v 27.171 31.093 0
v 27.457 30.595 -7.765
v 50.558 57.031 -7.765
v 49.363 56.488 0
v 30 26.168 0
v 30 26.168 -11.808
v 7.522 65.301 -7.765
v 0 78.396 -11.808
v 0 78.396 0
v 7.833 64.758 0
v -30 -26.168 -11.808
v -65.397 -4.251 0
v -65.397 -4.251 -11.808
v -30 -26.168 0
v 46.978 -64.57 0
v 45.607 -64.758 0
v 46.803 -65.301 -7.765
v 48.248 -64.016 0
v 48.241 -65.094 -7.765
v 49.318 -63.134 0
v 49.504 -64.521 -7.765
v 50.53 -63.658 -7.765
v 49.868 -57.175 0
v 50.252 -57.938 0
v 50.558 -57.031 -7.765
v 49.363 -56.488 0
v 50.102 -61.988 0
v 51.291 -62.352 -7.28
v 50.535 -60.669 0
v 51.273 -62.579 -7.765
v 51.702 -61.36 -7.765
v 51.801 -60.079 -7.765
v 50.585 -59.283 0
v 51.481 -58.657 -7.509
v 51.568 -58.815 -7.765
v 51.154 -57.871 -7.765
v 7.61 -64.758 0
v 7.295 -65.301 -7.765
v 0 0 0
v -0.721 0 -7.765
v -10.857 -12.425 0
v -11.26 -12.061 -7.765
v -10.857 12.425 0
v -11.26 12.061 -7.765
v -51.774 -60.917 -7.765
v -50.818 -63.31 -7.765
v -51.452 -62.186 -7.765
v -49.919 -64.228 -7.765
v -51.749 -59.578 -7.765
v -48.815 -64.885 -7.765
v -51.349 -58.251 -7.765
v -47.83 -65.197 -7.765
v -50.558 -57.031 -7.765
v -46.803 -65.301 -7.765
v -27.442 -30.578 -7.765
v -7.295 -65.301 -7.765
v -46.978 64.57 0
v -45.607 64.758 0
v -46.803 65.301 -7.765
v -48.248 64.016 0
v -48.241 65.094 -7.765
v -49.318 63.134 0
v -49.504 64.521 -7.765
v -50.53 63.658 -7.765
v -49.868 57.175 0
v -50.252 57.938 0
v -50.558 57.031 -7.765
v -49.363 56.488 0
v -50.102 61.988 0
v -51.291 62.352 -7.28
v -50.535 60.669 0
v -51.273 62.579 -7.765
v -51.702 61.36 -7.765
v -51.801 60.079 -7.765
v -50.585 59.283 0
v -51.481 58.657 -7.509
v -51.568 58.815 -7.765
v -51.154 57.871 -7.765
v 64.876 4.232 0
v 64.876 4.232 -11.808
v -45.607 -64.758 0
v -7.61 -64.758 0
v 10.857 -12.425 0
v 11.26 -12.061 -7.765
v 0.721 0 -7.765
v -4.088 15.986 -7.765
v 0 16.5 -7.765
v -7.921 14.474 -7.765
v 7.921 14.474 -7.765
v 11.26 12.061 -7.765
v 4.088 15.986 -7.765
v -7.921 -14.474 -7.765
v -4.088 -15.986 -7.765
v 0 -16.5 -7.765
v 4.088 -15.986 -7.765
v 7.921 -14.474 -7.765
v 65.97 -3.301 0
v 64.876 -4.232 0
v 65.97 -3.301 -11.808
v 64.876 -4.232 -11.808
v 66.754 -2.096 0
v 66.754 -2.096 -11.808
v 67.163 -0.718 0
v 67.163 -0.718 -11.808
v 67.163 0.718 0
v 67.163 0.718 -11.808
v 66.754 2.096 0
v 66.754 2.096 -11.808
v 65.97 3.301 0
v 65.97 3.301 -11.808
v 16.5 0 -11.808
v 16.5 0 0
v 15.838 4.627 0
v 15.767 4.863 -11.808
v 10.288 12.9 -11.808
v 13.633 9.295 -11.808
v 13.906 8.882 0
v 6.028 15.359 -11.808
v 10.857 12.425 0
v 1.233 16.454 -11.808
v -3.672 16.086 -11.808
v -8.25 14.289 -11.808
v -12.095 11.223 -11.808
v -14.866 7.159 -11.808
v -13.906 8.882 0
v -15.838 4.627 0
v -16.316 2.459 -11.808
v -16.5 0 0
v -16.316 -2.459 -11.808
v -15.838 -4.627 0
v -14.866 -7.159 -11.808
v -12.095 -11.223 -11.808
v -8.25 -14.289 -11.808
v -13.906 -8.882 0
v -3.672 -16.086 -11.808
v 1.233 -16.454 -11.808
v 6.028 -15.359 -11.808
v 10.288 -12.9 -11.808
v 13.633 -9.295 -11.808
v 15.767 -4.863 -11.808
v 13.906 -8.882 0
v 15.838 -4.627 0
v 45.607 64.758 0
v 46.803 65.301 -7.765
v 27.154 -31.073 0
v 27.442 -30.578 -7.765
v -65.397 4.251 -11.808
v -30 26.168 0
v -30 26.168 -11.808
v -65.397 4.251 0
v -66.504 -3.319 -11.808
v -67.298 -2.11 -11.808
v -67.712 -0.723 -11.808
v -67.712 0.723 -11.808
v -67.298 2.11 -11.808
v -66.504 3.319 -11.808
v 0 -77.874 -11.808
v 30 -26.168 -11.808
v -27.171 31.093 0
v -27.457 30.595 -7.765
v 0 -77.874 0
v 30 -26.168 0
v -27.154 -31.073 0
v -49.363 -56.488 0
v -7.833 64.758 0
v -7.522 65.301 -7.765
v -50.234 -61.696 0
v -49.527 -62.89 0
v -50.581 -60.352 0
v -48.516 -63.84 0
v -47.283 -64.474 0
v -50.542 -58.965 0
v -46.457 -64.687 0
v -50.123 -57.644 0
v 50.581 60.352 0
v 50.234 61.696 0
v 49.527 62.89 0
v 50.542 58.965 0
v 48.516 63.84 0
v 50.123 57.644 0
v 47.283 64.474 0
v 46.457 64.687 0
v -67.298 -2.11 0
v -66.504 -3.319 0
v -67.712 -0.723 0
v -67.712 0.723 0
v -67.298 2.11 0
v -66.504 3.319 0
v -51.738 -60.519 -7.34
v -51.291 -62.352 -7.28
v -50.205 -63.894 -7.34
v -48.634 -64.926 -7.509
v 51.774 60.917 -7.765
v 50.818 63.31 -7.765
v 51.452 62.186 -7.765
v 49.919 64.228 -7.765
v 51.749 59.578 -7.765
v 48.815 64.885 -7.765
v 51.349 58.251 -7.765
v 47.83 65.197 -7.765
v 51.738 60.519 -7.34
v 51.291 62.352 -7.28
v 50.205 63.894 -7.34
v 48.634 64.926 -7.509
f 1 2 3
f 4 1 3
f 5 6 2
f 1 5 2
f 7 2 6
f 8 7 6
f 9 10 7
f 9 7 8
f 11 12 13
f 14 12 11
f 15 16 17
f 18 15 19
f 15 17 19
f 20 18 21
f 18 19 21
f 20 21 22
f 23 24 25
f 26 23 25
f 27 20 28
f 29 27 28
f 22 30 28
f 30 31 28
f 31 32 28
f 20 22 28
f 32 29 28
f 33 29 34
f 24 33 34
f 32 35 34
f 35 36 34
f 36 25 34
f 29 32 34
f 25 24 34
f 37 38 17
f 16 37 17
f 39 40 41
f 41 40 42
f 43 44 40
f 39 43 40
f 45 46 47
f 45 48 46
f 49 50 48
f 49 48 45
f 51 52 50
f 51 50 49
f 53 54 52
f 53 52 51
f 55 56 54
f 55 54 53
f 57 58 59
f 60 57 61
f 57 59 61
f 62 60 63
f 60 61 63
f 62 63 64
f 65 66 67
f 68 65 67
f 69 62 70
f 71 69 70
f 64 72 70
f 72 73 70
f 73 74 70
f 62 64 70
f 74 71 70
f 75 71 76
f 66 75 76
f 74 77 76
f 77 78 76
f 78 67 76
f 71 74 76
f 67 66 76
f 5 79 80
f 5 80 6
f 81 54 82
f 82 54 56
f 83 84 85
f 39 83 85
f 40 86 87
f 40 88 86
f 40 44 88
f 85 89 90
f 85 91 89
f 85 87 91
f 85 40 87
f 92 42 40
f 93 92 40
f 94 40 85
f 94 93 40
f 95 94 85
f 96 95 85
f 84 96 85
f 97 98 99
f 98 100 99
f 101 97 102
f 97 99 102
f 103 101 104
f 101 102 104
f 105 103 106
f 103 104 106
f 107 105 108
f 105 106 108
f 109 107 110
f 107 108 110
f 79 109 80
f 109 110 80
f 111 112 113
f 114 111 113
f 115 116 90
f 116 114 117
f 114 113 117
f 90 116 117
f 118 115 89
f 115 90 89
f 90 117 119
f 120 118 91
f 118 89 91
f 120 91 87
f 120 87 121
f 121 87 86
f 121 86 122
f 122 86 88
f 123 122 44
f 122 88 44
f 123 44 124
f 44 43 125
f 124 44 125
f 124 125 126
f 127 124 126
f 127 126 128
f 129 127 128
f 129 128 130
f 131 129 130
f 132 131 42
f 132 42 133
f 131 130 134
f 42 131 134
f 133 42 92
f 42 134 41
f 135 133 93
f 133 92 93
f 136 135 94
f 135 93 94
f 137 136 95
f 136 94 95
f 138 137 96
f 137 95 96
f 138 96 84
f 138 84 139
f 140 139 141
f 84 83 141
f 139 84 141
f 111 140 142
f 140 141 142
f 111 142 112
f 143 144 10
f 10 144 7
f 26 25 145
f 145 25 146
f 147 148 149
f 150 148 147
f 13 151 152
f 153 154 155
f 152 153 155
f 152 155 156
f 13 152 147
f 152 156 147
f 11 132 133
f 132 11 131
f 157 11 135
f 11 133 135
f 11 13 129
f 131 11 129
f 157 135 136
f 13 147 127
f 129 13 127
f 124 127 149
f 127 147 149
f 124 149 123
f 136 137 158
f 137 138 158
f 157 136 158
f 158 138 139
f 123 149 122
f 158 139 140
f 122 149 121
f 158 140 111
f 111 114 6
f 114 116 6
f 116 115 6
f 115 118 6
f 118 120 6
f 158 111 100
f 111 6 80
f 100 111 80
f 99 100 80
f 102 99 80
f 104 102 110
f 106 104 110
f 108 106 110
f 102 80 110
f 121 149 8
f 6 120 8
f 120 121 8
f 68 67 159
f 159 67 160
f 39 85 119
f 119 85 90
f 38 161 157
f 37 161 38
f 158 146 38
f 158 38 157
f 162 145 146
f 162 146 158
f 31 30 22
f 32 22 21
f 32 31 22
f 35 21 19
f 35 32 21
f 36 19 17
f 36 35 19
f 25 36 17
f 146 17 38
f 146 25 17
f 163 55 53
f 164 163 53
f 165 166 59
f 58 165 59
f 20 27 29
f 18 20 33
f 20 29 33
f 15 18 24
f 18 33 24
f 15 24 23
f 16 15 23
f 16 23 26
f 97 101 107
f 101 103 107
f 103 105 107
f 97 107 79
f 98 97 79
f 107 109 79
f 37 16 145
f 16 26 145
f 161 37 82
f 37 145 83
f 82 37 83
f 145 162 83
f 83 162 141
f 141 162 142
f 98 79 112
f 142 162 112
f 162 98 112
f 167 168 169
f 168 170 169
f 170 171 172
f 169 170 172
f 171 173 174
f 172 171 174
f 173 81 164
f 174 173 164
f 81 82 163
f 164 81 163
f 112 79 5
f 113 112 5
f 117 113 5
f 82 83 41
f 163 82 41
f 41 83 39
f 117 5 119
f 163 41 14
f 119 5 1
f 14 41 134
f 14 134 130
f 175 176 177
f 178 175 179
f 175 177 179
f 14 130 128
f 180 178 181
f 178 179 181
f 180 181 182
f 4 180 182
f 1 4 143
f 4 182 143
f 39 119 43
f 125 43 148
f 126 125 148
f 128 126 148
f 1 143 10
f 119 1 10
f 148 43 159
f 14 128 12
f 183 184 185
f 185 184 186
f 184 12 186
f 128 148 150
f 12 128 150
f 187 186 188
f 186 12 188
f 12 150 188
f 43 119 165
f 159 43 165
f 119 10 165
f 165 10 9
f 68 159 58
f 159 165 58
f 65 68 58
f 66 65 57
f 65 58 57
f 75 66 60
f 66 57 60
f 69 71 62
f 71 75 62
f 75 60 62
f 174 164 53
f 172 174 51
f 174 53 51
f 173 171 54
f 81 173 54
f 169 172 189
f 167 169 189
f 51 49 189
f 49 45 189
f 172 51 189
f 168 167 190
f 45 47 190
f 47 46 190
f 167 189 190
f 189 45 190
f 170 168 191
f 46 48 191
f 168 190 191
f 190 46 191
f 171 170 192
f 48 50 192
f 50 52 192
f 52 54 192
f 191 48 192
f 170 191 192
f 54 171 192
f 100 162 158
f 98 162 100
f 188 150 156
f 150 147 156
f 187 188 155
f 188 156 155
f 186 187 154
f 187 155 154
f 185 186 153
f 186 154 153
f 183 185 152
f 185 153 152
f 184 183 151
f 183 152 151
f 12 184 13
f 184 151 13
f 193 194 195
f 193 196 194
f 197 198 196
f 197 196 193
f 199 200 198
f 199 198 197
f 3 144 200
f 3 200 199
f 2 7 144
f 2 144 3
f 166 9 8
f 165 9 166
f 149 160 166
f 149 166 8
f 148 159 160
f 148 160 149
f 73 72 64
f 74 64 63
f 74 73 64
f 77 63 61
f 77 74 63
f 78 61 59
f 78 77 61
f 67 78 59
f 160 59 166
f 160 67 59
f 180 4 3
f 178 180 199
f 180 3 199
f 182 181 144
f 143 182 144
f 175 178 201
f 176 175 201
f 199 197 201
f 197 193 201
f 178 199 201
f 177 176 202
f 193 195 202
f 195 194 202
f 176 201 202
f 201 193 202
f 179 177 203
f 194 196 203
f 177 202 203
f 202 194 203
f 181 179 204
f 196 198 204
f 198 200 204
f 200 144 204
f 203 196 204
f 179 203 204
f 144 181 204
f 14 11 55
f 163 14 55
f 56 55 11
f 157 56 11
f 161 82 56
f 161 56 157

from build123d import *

# Parameters (mm, degrees)
F0_W     = 60
F0_H     = 52.3357634497
F0_R     = 16.5
F1_DEPTH = 11.80754
F3_DEPTH = 7.76524
F3_TAPER = -4
F4_R     = 5
F5_R     = 5


with BuildPart() as f1:
    # F0 (on Top) → F1 (new body)
    with BuildSketch(Plane.XY):
        Polygon((0, 78.3958006123), (-30, 26.1678817249), (30, 26.1678817249), align=None)
        Rectangle(F0_W, F0_H)
        Circle(F0_R, mode=Mode.SUBTRACT)
        Polygon((-30, -26.1678817249), (-30, 26.1678817249), (-72.2627720197, 0), align=None)
        Polygon((71.6058312025, 0), (30, 26.1678817249), (30, -26.1678817249), align=None)
        Polygon((30, -26.1678817249), (-30, -26.1678817249), (0, -77.8738003652), align=None)
    extrude(amount=-F1_DEPTH)

    # F2 (on Top) → F3 (join)
    with BuildSketch(Plane.XY):
        Polygon((56.5895004995, -64.7582306214), (0, 0), (-56.5895004995, -64.7582306214), align=None)
        Polygon((-56.5895004995, 64.7582306214), (0, 0), (56.5895004995, 64.7582306214), align=None)
    extrude(amount=-F3_DEPTH, taper=F3_TAPER)

    # F4
    f4_edges = [f1.edges().sort_by_distance(p)[0] for p in [
        (-57.187308, 65.02973, -3.88262),
        (-72.262772, 0, -5.90377),
        (-57.187308, -65.02973, -3.88262),
    ]]
    fillet(f4_edges, radius=F4_R)

    # F5
    f5_edges = [f1.edges().sort_by_distance(p)[0] for p in [
        (57.187308, 65.02973, -3.88262),
        (71.605831, 0, -5.90377),
        (57.187308, -65.02973, -3.88262),
    ]]
    fillet(f5_edges, radius=F5_R)


solid = f1.part
